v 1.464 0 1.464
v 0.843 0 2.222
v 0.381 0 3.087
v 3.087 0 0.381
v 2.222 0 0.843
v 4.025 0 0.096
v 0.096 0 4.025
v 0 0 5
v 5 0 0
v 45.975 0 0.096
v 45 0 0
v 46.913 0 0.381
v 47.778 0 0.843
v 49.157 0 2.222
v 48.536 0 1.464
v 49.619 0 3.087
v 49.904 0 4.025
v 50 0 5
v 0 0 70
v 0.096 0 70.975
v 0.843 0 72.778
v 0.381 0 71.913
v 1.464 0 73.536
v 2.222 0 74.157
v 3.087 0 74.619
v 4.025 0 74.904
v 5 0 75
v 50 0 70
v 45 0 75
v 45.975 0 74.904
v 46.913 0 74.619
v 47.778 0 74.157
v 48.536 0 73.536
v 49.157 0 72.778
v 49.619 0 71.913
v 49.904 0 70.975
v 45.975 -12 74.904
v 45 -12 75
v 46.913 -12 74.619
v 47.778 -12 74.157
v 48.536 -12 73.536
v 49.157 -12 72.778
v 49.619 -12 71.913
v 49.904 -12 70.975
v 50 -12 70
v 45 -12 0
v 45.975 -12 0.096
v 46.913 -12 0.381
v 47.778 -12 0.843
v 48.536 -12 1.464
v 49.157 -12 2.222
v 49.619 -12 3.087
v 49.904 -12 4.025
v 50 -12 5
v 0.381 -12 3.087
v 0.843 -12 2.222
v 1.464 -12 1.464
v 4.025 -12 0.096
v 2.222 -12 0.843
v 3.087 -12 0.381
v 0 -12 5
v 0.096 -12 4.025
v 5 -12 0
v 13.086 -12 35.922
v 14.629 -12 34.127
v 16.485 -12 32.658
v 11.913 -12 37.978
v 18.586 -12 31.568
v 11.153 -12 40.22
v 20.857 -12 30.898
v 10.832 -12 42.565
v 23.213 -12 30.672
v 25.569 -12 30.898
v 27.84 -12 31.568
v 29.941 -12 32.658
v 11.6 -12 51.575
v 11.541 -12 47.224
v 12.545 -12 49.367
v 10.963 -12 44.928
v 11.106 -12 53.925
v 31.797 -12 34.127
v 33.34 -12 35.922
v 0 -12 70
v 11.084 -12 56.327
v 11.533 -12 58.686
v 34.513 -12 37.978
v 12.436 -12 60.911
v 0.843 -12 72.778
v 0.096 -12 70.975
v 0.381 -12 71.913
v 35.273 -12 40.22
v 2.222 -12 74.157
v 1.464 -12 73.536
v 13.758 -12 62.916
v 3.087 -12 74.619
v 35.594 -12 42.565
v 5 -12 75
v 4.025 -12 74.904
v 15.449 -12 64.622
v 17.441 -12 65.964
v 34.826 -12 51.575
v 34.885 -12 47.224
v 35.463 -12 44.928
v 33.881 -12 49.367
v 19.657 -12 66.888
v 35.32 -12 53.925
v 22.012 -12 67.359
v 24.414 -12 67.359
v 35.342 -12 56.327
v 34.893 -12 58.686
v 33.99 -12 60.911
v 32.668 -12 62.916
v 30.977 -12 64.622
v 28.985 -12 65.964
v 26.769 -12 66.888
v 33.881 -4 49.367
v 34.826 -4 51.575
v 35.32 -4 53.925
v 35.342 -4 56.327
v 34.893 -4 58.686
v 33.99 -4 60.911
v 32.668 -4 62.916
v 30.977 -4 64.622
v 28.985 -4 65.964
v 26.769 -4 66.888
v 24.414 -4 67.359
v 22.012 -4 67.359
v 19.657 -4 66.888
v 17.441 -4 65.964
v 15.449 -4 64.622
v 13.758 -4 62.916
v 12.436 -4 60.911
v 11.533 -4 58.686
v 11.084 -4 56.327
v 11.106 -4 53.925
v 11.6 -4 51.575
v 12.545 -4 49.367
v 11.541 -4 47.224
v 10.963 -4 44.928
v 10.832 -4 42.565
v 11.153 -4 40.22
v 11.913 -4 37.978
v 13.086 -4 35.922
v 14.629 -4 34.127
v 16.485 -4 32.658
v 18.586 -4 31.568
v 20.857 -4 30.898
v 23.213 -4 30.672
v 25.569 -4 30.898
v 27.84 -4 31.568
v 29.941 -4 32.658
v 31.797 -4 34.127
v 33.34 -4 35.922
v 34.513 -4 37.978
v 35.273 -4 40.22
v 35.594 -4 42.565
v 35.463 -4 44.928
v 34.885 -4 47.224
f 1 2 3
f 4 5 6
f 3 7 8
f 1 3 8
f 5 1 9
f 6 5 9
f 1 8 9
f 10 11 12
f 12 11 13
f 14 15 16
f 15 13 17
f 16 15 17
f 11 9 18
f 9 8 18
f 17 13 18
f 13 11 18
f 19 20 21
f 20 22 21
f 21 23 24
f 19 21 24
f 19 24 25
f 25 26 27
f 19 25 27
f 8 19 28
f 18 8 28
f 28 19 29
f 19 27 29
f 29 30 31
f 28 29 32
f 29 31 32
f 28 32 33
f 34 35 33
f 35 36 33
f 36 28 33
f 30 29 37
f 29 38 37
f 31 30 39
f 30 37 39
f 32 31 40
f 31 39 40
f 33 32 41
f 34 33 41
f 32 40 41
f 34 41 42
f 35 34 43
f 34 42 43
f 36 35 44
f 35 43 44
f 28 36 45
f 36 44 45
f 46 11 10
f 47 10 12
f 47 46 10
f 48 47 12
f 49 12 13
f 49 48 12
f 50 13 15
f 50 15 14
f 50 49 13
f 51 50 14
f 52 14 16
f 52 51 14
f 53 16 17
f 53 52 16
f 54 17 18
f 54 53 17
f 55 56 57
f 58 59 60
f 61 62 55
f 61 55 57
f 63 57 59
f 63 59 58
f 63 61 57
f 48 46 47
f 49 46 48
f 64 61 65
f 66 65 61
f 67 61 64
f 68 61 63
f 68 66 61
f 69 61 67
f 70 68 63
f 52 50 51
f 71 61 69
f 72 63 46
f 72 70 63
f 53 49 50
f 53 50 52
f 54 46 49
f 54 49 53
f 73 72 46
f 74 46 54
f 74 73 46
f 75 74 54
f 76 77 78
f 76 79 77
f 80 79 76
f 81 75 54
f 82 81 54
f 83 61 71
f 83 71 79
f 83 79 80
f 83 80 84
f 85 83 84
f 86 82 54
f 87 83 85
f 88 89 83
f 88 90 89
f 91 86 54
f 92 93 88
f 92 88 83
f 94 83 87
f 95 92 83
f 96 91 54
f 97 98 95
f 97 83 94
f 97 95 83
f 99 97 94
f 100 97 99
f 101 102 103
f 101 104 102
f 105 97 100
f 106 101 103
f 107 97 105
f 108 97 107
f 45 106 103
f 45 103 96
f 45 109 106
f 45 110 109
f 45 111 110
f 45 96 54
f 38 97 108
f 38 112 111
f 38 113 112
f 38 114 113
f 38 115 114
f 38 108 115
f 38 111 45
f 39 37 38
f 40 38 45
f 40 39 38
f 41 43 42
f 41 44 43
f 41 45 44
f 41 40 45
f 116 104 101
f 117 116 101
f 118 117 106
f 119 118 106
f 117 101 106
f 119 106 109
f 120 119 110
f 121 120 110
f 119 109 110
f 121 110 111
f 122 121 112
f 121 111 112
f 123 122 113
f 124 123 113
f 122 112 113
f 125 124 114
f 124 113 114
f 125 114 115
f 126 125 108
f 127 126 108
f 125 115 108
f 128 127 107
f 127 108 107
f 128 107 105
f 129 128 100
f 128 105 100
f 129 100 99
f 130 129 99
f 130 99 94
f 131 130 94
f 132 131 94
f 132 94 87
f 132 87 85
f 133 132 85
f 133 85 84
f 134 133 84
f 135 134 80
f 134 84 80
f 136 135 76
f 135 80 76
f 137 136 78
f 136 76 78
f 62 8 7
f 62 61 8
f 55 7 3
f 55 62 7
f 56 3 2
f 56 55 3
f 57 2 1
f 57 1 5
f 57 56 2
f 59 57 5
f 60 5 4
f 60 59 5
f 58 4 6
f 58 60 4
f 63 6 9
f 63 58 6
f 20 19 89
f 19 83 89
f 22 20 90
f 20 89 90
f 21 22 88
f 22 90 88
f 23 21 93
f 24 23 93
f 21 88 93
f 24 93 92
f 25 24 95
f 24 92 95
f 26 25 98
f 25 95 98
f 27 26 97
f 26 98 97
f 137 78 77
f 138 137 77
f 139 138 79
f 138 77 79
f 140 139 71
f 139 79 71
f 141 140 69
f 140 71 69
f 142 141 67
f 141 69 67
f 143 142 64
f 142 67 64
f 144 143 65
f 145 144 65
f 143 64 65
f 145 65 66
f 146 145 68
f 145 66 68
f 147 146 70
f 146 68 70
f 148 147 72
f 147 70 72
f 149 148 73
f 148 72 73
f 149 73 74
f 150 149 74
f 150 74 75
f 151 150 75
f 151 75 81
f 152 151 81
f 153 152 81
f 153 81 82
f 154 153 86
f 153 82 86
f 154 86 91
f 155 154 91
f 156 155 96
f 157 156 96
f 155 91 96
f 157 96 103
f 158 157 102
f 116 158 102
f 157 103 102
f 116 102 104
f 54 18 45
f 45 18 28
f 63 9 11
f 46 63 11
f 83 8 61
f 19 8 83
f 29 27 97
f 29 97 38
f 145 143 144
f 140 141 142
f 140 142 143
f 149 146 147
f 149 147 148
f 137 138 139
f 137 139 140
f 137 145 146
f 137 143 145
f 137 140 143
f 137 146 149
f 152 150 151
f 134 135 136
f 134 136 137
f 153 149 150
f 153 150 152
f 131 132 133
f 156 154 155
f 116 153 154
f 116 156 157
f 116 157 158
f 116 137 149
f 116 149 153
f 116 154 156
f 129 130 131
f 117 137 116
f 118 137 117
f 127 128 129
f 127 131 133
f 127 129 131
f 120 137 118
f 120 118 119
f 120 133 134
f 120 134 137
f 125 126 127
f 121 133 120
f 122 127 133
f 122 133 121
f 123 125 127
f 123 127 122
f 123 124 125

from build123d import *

# Parameters (mm, degrees)
F0_W     = 50
F0_H     = 75
F1_DEPTH = 12
F3_DEPTH = 8
F4_R     = 5


with BuildPart() as f1:
    # F0 (on Front) → F1 (new body)
    with BuildSketch(Plane.XZ):
        with Locations((25, 37.5)):
            Rectangle(F0_W, F0_H)
    extrude(amount=F1_DEPTH)

    # F2 (on face) → F3 (cut)
    with BuildSketch(Plane.XZ.offset(12)):
        with BuildLine():
            ThreePointArc((12.545369, 49.367264), (23.213018, 30.672003), (33.880667, 49.367264))
            ThreePointArc((33.880667, 49.367264), (23.213018, 67.418774), (12.545369, 49.367264))
        make_face()
    extrude(amount=-F3_DEPTH, mode=Mode.SUBTRACT)

    # F4
    f4_edges = [f1.edges().sort_by_distance(p)[0] for p in [
        (50, -6, 0),
        (50, -6, 75),
        (0, -6, 75),
        (0, -6, 0),
    ]]
    fillet(f4_edges, radius=F4_R)


solid = f1.part
